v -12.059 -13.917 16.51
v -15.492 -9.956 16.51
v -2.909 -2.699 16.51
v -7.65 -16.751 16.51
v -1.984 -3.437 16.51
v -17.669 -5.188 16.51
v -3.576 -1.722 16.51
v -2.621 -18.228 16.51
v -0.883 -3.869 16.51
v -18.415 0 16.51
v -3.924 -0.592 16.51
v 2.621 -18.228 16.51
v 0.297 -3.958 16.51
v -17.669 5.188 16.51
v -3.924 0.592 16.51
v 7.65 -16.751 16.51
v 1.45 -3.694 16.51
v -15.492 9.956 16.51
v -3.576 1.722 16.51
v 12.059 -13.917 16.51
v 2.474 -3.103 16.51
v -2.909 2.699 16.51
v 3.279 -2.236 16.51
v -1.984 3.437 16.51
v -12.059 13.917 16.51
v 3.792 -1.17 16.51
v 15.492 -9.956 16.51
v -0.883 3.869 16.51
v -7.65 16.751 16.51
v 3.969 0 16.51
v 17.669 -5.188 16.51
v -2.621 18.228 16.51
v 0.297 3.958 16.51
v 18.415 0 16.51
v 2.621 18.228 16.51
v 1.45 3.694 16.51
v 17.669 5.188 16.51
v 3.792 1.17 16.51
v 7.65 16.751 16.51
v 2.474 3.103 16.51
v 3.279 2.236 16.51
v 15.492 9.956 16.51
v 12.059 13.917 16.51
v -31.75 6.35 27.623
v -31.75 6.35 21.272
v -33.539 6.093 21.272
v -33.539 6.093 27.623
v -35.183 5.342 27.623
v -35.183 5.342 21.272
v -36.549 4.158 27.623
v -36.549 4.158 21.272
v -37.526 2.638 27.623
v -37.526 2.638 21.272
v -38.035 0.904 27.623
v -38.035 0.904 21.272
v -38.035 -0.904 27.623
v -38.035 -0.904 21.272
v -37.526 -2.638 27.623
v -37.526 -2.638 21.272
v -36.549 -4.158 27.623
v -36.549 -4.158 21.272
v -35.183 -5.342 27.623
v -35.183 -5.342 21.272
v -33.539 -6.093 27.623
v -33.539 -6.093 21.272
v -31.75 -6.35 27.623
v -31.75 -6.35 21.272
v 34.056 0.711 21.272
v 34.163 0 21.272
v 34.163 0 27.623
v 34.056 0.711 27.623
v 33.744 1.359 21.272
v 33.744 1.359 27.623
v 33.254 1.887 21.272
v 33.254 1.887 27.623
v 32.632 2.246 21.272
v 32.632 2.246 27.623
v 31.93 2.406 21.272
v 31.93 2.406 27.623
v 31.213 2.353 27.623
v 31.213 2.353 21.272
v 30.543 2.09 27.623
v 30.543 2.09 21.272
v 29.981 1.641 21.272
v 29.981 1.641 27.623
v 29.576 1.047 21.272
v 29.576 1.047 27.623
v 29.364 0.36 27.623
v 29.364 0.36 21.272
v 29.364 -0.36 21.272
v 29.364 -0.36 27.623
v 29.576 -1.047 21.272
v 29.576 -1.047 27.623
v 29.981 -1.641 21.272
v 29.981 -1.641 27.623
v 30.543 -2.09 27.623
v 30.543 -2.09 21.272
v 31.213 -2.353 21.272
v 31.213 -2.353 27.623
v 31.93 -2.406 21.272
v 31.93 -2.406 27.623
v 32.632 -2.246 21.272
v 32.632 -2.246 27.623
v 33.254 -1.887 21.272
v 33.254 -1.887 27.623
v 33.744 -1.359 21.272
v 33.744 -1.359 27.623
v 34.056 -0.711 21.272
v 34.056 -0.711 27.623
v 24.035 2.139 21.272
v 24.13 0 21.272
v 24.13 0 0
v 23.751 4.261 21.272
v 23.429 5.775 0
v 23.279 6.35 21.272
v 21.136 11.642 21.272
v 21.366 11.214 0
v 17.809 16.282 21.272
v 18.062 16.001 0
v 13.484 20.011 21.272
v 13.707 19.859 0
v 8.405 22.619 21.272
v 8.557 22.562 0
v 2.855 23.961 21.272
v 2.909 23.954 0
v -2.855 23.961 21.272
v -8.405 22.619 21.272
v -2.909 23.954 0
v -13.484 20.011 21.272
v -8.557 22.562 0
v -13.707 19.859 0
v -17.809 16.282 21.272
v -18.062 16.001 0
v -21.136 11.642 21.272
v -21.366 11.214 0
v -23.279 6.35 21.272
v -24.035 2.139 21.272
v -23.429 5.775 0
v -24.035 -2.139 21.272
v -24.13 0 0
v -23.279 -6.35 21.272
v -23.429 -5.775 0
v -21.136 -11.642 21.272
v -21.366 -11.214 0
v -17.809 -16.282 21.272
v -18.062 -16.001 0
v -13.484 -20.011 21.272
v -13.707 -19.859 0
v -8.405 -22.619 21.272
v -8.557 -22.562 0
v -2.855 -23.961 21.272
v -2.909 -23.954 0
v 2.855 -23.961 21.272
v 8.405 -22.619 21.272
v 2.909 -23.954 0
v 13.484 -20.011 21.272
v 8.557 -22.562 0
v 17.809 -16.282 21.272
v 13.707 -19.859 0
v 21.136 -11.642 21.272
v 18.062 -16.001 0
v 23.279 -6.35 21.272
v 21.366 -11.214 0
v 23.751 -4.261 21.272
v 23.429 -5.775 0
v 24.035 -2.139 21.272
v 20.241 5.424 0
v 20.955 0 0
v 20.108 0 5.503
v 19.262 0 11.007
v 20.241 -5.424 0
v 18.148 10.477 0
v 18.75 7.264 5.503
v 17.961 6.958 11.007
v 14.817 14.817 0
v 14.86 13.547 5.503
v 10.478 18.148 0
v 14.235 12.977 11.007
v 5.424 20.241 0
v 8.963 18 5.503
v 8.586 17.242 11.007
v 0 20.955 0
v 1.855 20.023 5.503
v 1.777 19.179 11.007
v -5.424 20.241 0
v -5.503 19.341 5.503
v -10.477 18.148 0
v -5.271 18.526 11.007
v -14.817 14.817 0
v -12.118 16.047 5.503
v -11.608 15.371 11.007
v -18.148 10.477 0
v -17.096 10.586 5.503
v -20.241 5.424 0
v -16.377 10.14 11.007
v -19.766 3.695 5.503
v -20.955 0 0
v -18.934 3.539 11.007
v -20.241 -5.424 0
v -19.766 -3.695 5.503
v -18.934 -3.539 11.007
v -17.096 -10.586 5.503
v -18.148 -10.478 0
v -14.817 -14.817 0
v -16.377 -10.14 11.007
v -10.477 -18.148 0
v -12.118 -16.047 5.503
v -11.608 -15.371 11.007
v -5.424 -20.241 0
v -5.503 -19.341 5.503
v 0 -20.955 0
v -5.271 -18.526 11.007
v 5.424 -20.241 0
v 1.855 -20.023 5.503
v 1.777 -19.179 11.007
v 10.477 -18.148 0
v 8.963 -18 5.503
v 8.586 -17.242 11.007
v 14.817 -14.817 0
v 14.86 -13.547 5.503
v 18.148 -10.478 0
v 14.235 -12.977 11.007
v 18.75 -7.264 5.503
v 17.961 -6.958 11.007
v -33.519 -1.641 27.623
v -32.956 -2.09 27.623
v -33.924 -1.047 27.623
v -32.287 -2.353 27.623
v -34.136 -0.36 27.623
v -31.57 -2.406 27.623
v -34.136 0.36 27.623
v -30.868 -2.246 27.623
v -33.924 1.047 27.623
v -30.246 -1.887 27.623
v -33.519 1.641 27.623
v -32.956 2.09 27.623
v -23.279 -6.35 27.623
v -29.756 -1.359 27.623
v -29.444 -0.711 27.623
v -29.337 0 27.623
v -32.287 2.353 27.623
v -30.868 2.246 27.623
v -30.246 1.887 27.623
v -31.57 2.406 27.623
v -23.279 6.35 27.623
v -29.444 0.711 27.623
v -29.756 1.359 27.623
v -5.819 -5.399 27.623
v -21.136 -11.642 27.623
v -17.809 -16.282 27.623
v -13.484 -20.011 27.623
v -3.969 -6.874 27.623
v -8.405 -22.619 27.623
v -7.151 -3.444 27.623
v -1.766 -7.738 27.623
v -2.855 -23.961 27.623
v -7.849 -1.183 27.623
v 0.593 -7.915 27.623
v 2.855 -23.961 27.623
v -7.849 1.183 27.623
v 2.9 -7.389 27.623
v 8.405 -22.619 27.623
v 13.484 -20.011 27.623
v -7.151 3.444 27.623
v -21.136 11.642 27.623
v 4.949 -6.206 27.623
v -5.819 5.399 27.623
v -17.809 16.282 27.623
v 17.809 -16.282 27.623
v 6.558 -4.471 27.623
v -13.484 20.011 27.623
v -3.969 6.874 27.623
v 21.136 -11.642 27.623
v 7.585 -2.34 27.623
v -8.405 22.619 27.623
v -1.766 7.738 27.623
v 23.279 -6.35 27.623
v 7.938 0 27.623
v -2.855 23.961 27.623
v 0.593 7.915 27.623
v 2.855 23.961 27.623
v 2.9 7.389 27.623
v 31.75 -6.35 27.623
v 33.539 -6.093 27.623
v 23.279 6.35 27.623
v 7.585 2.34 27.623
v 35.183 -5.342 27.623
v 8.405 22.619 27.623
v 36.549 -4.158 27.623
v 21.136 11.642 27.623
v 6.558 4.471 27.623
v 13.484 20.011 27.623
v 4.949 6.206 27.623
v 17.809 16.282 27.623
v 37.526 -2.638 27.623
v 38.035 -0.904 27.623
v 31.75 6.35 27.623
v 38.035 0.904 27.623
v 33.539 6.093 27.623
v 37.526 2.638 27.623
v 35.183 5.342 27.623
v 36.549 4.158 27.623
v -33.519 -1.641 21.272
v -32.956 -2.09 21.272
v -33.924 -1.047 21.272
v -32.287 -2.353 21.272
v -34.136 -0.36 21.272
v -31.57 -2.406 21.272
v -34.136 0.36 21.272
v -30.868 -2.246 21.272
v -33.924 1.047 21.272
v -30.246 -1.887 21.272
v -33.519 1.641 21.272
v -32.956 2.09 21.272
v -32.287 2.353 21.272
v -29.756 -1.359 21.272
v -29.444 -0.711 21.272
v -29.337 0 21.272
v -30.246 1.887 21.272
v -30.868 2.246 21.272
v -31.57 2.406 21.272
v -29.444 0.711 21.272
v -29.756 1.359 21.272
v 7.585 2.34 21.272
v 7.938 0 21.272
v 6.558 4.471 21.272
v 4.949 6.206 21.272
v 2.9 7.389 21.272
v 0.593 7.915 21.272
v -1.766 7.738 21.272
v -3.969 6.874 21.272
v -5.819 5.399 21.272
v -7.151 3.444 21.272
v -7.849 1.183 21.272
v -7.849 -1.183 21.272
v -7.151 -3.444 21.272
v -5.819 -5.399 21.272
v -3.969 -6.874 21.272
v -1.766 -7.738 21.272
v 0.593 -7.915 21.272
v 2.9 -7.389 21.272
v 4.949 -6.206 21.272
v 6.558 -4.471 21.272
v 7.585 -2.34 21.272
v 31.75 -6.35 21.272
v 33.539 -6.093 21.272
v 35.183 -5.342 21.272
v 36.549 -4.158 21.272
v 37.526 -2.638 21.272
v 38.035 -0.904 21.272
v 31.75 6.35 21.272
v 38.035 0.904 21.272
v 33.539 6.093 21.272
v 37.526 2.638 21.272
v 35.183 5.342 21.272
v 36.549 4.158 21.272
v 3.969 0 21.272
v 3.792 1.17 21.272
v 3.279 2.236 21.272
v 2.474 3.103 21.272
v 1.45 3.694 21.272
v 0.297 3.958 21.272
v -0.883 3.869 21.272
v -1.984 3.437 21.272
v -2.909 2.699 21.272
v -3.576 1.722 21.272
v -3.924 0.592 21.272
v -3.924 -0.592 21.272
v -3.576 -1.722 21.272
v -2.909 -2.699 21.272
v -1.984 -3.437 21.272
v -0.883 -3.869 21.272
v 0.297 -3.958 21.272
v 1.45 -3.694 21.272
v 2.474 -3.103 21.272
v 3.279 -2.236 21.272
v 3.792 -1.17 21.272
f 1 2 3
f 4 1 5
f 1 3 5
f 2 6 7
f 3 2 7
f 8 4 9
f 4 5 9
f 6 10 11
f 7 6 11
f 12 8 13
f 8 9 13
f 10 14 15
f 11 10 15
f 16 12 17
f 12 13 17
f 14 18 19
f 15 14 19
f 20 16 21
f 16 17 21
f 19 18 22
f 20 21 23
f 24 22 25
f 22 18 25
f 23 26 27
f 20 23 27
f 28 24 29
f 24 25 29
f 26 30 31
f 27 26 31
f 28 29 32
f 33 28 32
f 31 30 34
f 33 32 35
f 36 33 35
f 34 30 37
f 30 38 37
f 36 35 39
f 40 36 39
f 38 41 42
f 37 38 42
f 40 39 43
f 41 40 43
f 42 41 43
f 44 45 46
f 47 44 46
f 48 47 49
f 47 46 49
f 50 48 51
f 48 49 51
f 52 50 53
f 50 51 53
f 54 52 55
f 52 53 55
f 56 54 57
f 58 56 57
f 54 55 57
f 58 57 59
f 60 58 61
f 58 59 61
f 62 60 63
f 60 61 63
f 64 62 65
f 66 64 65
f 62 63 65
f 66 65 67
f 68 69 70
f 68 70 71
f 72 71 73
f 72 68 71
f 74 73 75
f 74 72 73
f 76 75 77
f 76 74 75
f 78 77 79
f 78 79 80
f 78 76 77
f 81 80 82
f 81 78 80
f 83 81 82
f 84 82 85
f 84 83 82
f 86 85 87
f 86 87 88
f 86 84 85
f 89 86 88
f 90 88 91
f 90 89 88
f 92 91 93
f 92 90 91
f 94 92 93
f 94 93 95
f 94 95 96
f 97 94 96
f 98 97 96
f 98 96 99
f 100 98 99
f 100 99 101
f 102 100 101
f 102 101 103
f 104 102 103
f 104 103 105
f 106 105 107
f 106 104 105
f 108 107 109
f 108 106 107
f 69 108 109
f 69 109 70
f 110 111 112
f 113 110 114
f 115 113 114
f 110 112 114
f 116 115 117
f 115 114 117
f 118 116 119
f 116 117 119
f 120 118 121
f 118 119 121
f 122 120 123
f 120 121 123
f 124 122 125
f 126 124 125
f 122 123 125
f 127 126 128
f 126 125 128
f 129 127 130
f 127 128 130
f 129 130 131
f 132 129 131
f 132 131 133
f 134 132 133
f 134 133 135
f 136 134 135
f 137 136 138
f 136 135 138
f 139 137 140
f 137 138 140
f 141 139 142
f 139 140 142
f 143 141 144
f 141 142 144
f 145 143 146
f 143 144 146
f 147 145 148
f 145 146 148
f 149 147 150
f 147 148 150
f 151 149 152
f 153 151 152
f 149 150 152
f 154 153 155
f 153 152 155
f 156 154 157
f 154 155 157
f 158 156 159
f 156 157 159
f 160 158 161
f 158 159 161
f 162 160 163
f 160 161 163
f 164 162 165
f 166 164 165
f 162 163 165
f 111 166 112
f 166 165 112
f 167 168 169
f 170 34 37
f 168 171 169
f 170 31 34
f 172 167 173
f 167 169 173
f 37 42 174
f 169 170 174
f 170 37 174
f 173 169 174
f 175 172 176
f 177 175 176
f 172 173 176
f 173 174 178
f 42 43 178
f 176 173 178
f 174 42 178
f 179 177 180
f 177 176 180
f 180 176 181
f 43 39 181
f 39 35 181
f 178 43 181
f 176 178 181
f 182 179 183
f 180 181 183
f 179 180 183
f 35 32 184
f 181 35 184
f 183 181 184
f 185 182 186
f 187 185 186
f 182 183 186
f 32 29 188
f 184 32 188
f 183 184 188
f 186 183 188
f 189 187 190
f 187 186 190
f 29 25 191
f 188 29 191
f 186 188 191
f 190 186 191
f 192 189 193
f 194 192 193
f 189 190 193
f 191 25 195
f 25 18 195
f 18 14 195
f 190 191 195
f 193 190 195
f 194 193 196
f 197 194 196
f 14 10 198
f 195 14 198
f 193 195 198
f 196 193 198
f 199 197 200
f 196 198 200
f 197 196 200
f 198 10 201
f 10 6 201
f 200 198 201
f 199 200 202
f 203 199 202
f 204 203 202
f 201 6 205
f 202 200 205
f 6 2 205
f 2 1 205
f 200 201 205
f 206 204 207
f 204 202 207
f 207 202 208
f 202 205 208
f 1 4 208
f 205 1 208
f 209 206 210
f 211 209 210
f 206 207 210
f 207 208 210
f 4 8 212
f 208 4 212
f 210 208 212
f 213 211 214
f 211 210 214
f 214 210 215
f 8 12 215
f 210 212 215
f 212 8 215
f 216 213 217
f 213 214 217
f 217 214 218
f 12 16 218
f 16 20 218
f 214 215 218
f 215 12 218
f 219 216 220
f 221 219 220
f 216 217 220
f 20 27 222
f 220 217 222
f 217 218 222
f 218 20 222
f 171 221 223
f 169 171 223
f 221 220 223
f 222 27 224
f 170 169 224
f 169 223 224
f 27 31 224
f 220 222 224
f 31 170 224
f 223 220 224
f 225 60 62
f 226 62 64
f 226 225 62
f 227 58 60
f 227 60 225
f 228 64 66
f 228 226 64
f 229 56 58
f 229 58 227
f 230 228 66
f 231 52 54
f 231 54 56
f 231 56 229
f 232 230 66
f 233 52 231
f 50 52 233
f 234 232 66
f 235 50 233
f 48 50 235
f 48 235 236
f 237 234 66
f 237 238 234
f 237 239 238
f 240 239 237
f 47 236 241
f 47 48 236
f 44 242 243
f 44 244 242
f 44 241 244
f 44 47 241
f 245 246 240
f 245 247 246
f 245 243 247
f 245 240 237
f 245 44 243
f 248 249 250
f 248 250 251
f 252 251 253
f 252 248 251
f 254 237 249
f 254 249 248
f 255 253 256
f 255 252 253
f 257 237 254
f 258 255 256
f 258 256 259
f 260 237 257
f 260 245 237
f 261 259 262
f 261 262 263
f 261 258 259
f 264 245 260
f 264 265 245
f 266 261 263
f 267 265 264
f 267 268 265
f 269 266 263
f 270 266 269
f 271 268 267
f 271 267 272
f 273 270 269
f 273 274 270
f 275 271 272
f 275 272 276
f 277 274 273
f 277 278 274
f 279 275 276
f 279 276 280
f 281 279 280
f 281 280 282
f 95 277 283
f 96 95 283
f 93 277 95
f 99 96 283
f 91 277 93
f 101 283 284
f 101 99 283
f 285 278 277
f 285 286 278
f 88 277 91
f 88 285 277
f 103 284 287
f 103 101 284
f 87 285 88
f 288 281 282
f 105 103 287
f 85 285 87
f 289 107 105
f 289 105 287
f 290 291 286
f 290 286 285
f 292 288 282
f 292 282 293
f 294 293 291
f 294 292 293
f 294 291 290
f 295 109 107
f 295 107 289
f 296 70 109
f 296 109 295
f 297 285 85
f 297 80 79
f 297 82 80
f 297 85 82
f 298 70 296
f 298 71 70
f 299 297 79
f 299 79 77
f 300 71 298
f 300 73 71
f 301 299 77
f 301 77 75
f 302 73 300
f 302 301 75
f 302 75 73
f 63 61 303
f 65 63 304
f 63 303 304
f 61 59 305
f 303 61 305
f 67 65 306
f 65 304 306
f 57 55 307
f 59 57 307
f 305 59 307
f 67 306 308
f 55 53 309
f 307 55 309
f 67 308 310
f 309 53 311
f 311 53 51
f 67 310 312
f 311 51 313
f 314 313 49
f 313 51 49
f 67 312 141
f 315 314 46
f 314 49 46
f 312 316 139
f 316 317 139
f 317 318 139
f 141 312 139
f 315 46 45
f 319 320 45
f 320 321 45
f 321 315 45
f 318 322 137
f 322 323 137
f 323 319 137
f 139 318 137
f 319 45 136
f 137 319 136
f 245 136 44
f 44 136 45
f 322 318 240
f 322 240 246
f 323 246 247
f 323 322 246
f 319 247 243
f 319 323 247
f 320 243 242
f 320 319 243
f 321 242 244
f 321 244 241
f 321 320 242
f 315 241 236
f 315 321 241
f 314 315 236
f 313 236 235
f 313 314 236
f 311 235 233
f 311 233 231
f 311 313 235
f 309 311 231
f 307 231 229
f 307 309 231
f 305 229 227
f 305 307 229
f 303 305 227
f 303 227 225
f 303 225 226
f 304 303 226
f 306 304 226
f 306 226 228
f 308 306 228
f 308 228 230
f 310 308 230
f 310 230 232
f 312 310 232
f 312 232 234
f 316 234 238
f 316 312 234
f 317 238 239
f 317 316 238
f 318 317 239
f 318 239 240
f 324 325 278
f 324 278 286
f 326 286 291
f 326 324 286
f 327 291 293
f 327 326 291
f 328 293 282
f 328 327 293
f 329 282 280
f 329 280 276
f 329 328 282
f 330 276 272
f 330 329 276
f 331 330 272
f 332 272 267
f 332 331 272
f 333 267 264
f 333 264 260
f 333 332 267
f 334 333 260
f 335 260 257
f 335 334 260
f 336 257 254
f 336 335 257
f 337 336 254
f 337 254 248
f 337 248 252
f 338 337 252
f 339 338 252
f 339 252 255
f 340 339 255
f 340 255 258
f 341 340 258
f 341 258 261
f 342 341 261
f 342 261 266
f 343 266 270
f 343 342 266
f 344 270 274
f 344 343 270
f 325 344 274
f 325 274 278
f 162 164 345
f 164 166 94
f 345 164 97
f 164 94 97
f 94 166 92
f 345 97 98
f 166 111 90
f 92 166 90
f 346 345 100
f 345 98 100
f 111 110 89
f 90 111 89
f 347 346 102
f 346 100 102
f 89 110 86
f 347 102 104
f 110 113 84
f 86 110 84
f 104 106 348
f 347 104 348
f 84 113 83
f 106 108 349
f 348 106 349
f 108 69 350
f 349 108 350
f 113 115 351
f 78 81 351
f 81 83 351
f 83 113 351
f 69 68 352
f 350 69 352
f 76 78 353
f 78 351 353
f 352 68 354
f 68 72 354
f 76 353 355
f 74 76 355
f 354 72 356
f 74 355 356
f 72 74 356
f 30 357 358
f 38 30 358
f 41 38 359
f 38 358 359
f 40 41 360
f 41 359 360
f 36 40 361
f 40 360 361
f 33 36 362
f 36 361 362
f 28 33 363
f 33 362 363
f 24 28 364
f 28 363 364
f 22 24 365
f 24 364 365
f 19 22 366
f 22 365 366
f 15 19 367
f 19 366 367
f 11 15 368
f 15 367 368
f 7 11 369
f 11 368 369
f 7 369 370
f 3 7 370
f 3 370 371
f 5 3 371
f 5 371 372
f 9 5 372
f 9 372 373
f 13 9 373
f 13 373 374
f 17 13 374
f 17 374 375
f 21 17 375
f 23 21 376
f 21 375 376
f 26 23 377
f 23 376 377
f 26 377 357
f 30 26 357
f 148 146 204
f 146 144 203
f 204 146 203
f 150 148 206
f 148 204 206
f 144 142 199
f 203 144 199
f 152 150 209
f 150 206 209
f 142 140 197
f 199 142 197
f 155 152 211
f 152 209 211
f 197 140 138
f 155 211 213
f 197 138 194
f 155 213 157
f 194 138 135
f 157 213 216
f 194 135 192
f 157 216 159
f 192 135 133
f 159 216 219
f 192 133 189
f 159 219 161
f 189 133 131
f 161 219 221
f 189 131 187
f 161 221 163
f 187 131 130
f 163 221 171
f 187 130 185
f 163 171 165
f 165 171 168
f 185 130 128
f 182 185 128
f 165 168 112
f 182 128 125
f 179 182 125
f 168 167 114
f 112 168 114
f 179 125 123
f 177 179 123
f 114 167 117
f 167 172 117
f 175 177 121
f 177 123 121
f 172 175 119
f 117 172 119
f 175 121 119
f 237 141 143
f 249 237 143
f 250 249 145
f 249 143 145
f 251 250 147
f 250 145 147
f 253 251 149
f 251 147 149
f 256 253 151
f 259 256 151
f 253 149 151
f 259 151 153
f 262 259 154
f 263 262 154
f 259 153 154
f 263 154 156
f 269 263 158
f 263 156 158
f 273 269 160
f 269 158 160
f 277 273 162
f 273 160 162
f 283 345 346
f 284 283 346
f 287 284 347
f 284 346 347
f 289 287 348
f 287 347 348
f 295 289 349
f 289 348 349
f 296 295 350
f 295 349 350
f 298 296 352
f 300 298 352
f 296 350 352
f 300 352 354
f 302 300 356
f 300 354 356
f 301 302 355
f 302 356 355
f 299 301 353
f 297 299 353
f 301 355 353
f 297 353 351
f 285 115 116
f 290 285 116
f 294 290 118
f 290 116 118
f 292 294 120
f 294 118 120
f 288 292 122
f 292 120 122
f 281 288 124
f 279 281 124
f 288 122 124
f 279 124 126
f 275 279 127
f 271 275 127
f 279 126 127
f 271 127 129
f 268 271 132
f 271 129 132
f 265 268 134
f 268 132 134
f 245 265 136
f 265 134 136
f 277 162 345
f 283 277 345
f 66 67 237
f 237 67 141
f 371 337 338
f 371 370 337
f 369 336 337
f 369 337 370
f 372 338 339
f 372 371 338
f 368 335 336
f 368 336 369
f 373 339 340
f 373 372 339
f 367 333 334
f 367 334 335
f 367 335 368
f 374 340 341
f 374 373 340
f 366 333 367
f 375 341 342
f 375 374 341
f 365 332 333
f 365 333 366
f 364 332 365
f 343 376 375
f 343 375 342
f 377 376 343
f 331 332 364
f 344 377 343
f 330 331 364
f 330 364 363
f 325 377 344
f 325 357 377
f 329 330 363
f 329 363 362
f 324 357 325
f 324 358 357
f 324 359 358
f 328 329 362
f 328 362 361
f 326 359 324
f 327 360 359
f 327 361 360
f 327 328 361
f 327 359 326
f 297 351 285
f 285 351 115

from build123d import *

# Parameters (mm, degrees)
F0_R     = 24.13
F0_R_2   = 20.955
F1_DEPTH = 16.51
F2_R     = 18.415
F2_R_2   = 24.13
F4_DEPTH = 4.7625
F5_R     = 3.96875
F6_DEPTH = 4.7625
F5_R_2   = 2.413
F5_R_3   = 7.9375
F7_DEPTH = 6.35


# Not quite as in the source:
# - a feature names something its author has since deleted; it is built from what else it names


with BuildPart() as f1:
    # F0 (on Top) → F1 (new body)
    with BuildSketch(Plane.XY):
        Circle(F0_R)
        Circle(F0_R_2, mode=Mode.SUBTRACT)
        Circle(F0_R_2)
    extrude(amount=F1_DEPTH)

    # F0 (on Top) → F3 section 0
    with BuildSketch(Plane.XY):
        Circle(F0_R_2)
    # F2 (on face) → F3 section 1
    with BuildSketch(Plane.XY.offset(16.51)):
        Circle(F2_R)
    loft(mode=Mode.SUBTRACT)

    # F2 (on face) → F4 (join)
    with BuildSketch(Plane.XY.offset(16.51)):
        Circle(F2_R_2)
        Circle(F2_R, mode=Mode.SUBTRACT)
        Circle(F2_R)
    extrude(amount=F4_DEPTH)

    # F5 (on face) → F6 (cut, through all)
    with BuildSketch(Plane.XY.offset(21.2725)):
        Circle(F5_R)
    extrude(amount=-F6_DEPTH, mode=Mode.SUBTRACT)

    # F5 (on face) → F7 (join)
    with BuildSketch(Plane.XY.offset(21.2725)):
        with BuildLine():
            Line((-26.2298047315, 6.35), (-31.75, 6.35))
            ThreePointArc((-31.75, 6.35), (-38.1, 0), (-31.75, -6.35))
            Line((-31.75, -6.35), (-26.2298047315, -6.35))
            ThreePointArc((-26.2298047315, -6.35), (-26.9875, 0), (-26.2298047315, 6.35))
        make_face()
        with Locations((-31.75, 0)):
            Circle(F5_R_2, mode=Mode.SUBTRACT)
        with BuildLine():
            ThreePointArc((23.2794845304, 6.35), (0, 24.13), (-23.2794845304, 6.35))
            ThreePointArc((-23.2794845304, 6.35), (-24.13, 0), (-23.2794845304, -6.35))
            ThreePointArc((-23.2794845304, -6.35), (0, -24.13), (23.2794845304, -6.35))
            ThreePointArc((23.2794845304, -6.35), (23.9164259633, -3.2033527968), (24.13, 0))
            ThreePointArc((24.13, 0), (23.9164259633, 3.2033527968), (23.2794845304, 6.35))
        make_face()
        Circle(F5_R_3, mode=Mode.SUBTRACT)
        with BuildLine():
            Line((31.75, 6.35), (26.2298047315, 6.35))
            ThreePointArc((26.2298047315, 6.35), (26.9875, 0), (26.2298047315, -6.35))
            Line((26.2298047315, -6.35), (31.75, -6.35))
            ThreePointArc((31.75, -6.35), (38.1, 0), (31.75, 6.35))
        make_face()
        with Locations((31.75, 0)):
            Circle(F5_R_2, mode=Mode.SUBTRACT)
        with BuildLine():
            Line((-23.2794845304, 6.35), (-26.2298047315, 6.35))
            ThreePointArc((-26.2298047315, 6.35), (-26.9875, 0), (-26.2298047315, -6.35))
            Line((-26.2298047315, -6.35), (-23.2794845304, -6.35))
            ThreePointArc((-23.2794845304, -6.35), (-24.13, 0), (-23.2794845304, 6.35))
        make_face()
        with BuildLine():
            Line((26.2298047315, 6.35), (23.2794845304, 6.35))
            ThreePointArc((23.2794845304, 6.35), (23.9164259633, 3.2033527968), (24.13, 0))
            ThreePointArc((24.13, 0), (23.9164259633, -3.2033527968), (23.2794845304, -6.35))
            Line((23.2794845304, -6.35), (26.2298047315, -6.35))
            ThreePointArc((26.2298047315, -6.35), (26.9875, 0), (26.2298047315, 6.35))
        make_face()
    extrude(amount=F7_DEPTH)


solid = f1.part
